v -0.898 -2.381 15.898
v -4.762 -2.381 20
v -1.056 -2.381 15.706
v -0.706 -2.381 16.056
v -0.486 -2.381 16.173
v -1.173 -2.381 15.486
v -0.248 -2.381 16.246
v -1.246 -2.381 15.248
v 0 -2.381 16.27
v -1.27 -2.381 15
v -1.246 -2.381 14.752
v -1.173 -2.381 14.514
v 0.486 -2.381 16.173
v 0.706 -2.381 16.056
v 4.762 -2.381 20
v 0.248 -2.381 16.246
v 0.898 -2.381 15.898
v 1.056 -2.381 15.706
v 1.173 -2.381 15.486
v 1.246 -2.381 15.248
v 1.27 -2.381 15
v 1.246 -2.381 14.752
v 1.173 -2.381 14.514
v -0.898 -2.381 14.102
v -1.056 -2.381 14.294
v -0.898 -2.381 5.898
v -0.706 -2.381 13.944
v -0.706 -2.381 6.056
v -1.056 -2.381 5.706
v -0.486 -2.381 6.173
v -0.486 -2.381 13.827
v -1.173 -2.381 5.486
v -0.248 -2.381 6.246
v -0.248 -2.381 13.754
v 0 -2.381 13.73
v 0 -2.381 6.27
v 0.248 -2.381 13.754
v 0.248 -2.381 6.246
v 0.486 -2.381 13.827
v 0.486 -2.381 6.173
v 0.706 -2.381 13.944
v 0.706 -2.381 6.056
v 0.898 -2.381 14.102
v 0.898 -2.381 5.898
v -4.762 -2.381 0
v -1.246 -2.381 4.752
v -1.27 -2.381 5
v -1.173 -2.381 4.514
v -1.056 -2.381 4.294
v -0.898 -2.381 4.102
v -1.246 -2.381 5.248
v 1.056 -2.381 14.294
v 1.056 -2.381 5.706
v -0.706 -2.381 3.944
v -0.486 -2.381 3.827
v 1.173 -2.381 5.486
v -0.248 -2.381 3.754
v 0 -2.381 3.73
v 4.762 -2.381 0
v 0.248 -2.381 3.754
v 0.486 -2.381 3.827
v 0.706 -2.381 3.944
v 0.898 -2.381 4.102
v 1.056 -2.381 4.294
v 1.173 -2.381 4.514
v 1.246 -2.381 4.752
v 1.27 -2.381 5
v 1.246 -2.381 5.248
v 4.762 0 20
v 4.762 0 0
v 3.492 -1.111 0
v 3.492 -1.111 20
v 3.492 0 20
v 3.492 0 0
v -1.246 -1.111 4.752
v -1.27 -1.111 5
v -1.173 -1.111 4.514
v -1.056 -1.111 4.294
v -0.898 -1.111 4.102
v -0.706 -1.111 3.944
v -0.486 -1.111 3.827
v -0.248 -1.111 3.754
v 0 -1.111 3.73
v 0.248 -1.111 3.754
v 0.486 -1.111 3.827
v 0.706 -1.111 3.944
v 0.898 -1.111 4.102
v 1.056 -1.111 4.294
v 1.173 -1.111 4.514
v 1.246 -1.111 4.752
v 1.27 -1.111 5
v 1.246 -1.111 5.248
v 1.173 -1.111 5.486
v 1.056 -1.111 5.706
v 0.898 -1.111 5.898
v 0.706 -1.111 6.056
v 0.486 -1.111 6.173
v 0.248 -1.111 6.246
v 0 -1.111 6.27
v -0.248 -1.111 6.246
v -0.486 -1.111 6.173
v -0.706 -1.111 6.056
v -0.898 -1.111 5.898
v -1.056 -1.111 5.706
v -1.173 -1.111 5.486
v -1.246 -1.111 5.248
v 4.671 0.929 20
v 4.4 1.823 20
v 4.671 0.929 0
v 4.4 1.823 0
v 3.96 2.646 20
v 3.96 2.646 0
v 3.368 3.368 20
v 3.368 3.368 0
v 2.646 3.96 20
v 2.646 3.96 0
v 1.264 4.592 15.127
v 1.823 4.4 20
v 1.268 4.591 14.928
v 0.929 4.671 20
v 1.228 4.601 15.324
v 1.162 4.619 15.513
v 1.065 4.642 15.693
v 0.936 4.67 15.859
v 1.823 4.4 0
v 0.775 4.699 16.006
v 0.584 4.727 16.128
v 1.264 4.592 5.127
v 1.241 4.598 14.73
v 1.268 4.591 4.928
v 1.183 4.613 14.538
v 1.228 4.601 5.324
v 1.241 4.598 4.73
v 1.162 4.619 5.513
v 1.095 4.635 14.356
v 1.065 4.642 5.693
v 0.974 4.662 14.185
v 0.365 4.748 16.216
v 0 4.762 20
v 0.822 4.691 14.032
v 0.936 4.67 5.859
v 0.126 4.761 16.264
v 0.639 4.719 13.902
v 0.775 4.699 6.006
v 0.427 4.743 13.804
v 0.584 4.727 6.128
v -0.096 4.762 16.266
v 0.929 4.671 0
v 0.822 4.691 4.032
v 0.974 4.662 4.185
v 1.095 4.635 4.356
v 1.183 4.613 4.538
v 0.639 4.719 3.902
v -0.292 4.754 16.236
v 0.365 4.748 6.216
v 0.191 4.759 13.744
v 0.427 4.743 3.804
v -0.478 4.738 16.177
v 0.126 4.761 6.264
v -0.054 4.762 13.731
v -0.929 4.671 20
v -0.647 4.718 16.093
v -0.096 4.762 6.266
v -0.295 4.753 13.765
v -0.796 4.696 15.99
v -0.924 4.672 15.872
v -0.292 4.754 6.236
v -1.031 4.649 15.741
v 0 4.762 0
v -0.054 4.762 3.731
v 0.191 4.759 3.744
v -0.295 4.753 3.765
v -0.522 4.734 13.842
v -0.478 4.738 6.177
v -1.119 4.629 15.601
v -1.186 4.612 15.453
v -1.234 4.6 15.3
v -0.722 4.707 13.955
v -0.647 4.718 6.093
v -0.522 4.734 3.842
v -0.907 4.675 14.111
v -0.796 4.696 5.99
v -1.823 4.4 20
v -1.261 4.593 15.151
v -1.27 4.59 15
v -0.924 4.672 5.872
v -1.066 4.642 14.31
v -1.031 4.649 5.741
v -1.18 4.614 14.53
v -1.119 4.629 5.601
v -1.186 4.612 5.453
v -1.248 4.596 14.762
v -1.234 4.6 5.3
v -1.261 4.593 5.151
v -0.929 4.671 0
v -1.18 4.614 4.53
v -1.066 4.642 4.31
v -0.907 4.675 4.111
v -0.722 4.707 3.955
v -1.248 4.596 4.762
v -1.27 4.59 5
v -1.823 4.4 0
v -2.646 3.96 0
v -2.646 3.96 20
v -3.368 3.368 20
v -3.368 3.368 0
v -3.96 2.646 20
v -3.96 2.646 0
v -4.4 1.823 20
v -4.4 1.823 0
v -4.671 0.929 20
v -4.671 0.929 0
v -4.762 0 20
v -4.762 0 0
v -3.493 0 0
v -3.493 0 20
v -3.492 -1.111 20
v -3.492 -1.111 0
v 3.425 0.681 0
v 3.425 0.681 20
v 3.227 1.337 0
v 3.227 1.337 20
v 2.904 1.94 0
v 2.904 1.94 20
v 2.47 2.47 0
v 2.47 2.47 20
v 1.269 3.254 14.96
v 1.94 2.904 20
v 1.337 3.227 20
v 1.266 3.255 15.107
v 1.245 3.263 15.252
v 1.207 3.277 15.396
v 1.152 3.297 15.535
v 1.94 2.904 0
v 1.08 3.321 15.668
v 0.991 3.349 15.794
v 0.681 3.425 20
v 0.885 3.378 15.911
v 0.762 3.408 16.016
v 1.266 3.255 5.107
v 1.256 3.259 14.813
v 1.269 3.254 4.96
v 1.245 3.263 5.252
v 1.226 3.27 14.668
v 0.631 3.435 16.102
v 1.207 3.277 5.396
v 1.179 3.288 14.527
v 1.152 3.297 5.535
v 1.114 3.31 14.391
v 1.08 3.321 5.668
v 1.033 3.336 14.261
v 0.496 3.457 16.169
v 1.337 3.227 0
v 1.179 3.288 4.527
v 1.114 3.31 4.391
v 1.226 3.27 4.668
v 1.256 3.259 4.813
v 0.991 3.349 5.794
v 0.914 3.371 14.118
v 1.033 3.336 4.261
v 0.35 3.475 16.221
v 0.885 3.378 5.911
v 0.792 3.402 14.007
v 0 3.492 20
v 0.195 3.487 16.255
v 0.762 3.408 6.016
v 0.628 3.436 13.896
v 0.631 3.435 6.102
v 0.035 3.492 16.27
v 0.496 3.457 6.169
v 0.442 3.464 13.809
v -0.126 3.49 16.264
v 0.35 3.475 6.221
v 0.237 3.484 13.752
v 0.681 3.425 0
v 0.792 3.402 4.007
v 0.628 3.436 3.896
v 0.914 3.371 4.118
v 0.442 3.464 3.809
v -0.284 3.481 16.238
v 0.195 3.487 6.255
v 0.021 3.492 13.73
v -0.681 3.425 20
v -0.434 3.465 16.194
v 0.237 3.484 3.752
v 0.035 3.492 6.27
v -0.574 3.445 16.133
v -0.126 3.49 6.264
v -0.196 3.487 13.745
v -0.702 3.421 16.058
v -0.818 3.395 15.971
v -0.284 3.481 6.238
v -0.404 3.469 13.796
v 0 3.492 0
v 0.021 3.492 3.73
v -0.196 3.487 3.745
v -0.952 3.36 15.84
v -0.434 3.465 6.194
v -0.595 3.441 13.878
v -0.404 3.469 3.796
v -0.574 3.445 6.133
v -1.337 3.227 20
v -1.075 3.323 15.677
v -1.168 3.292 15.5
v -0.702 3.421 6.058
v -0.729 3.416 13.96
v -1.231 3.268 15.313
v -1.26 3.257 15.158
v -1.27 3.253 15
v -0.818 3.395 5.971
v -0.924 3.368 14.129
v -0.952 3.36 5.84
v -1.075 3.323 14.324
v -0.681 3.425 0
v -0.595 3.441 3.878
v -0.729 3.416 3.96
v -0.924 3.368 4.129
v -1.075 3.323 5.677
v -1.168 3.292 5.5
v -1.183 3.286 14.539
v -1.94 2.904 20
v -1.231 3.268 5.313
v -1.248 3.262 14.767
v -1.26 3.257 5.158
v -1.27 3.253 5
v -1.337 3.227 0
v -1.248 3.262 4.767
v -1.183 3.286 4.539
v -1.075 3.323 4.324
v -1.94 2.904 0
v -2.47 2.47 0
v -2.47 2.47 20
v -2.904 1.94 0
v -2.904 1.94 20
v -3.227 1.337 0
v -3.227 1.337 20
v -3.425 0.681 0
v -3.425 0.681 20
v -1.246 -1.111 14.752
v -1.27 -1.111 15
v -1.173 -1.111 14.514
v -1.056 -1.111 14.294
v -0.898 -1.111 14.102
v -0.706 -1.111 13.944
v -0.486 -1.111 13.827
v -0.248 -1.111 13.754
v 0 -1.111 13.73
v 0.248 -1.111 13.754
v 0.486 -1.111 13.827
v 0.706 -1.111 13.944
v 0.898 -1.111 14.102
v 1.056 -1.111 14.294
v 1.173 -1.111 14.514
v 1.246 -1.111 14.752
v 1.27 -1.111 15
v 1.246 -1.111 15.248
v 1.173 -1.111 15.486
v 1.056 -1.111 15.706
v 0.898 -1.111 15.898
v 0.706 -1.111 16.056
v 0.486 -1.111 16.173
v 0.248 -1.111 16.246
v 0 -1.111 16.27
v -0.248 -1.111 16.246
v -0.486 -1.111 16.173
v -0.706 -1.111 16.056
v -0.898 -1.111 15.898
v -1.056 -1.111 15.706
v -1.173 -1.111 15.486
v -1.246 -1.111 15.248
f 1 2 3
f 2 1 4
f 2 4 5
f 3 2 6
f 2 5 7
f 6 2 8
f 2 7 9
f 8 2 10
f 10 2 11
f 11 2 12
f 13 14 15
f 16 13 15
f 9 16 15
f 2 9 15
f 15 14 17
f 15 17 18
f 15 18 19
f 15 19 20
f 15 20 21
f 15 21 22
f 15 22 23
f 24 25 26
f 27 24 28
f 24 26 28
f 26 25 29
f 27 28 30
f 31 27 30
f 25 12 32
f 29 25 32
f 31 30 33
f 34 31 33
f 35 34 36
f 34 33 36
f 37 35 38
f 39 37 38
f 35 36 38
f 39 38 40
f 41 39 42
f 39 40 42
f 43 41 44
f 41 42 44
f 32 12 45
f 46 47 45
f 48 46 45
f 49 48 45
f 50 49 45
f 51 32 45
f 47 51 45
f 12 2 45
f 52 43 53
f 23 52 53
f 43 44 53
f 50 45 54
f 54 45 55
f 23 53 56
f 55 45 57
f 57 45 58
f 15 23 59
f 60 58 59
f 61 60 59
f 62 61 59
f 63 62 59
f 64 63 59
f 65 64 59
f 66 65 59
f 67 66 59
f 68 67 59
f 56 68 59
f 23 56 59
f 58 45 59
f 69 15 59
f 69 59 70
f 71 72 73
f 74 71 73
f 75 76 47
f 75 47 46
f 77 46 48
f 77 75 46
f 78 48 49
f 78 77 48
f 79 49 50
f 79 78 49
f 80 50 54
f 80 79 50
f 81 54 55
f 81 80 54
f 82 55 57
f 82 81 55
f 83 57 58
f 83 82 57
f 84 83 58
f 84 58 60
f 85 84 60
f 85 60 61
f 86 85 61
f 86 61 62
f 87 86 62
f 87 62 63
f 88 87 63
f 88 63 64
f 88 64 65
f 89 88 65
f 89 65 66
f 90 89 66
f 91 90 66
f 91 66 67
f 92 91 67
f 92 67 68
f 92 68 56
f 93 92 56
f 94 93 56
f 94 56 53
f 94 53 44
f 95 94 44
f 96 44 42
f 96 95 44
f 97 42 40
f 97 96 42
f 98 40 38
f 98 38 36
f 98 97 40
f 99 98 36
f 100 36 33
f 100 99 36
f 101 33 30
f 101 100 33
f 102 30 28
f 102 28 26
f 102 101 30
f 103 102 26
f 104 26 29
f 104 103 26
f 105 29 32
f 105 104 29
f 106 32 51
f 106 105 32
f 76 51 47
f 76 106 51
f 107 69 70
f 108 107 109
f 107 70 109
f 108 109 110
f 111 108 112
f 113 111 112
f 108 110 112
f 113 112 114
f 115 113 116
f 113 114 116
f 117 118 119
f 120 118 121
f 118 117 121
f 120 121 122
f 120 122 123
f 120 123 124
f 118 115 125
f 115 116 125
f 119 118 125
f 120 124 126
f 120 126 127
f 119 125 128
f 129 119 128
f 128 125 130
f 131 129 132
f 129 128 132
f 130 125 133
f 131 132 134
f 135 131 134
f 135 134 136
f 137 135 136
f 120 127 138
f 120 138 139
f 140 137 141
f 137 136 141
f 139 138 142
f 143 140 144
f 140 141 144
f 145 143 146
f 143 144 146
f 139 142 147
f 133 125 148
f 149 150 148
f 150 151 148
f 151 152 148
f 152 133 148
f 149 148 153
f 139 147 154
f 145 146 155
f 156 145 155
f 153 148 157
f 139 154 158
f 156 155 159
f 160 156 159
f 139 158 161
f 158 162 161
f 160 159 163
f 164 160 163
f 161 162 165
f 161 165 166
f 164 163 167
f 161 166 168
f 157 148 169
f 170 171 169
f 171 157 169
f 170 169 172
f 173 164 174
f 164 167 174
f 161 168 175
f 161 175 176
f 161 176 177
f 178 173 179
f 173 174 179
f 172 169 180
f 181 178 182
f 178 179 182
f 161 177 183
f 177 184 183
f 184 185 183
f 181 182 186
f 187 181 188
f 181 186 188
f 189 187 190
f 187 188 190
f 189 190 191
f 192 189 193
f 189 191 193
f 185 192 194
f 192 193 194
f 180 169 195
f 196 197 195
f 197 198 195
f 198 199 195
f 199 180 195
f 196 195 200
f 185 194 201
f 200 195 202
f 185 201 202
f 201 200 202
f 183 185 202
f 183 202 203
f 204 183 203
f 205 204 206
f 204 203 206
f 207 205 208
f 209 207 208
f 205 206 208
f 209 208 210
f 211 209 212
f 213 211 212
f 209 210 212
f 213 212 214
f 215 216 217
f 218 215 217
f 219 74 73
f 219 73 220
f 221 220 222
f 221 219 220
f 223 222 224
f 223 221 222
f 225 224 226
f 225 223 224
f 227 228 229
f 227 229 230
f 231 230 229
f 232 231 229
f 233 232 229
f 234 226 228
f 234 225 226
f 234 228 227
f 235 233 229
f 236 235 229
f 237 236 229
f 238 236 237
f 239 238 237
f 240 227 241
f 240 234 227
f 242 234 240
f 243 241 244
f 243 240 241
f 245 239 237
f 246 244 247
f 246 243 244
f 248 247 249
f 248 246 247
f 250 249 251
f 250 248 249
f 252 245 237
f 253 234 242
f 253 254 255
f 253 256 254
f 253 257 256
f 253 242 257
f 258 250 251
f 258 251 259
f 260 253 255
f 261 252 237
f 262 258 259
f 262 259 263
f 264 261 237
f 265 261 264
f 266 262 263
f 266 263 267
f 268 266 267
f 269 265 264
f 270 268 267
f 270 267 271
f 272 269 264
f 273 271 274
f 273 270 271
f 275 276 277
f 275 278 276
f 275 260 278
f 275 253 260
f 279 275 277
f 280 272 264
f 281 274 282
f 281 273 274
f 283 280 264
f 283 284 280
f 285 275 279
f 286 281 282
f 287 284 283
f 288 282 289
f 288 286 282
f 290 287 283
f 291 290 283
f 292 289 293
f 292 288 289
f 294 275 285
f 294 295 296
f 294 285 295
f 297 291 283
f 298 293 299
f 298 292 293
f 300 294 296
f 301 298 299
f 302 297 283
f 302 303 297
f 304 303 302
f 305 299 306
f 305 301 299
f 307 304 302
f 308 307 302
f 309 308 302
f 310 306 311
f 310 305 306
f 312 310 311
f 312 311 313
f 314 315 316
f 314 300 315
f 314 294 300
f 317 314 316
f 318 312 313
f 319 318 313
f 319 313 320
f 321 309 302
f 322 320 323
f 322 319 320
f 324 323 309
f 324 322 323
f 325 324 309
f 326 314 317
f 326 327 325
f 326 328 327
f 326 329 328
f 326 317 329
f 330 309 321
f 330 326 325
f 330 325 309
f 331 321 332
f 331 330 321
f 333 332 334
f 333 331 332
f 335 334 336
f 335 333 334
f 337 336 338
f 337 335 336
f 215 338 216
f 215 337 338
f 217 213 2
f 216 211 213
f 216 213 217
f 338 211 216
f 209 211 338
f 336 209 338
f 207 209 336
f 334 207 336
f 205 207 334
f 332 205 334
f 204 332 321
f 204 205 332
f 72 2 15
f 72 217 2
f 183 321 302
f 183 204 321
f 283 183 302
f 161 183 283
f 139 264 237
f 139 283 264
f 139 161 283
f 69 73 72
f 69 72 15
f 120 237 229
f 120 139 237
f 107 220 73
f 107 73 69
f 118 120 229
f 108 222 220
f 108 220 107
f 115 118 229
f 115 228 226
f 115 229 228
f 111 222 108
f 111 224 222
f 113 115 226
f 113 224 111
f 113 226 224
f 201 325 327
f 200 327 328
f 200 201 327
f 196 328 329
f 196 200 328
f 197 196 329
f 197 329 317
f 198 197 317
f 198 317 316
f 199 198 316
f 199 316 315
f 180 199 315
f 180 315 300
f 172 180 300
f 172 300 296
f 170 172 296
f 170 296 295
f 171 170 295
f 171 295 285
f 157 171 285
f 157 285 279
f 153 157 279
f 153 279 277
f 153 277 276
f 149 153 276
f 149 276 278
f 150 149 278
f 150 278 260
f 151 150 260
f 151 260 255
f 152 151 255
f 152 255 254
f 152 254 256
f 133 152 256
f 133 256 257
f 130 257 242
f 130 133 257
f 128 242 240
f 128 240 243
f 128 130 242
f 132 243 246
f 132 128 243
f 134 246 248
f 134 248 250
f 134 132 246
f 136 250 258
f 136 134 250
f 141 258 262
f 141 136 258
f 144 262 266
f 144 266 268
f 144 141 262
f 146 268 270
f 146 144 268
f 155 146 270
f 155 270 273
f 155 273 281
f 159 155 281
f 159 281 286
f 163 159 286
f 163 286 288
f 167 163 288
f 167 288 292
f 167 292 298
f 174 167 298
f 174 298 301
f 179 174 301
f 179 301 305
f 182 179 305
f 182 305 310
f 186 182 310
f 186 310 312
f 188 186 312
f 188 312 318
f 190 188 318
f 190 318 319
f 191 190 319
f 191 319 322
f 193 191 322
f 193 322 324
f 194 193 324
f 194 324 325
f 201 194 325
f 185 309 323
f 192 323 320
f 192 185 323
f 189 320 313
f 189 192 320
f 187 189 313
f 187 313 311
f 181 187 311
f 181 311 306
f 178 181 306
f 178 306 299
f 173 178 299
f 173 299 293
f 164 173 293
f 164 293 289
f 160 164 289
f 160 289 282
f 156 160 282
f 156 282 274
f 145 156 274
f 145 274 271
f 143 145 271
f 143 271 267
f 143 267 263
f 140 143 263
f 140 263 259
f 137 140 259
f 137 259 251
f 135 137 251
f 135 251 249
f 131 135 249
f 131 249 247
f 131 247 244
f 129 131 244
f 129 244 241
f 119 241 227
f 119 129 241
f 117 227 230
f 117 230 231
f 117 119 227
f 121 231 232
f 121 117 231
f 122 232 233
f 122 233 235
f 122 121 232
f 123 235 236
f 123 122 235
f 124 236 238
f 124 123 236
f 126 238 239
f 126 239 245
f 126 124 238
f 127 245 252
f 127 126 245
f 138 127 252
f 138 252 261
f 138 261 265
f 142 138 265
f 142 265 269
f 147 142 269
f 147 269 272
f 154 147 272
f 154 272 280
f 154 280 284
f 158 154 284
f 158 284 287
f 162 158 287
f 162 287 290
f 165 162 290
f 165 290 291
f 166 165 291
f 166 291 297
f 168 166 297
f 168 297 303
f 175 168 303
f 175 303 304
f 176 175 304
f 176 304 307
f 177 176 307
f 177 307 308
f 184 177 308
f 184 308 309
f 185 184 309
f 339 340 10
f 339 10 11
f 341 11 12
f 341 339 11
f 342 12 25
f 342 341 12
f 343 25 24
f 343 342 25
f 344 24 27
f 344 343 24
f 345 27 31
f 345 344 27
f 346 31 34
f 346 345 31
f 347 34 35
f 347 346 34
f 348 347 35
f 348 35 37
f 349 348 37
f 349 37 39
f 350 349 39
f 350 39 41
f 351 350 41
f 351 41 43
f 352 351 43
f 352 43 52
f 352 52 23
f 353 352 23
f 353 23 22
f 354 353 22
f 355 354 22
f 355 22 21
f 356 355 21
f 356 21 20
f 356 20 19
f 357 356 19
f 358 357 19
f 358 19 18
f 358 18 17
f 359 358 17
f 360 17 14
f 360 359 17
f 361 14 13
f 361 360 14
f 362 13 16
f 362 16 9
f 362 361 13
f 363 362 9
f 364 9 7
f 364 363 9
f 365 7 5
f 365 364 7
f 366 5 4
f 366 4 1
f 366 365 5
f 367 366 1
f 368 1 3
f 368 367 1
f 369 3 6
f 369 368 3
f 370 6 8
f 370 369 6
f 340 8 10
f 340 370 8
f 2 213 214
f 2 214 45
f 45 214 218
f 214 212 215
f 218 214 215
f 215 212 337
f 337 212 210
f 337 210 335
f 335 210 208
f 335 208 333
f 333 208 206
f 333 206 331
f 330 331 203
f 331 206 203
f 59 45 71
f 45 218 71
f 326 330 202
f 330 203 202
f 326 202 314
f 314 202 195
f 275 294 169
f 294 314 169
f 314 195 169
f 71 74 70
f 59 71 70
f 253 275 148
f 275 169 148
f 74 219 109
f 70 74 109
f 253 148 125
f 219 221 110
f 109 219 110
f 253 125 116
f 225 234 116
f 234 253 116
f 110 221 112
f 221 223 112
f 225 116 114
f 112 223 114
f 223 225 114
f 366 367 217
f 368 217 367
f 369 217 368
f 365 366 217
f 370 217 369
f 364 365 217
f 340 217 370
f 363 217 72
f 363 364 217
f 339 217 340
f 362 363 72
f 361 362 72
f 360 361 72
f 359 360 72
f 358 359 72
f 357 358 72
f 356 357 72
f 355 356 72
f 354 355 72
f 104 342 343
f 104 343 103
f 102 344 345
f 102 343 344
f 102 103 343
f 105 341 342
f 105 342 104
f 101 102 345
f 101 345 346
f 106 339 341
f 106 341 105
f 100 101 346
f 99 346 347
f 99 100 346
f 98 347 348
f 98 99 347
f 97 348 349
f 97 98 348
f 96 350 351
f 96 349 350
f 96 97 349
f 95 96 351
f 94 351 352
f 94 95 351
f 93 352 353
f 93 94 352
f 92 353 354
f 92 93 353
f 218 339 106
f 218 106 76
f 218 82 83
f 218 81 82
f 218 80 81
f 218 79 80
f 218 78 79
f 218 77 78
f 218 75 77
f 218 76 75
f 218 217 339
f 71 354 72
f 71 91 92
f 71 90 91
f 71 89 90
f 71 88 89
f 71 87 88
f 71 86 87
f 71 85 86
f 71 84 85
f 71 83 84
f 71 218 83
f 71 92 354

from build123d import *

# Parameters (mm, degrees)
BOSS_EXTRUDE1_DEPTH = 20
CUT_EXTRUDE1_START  = -7.14375
SKETCH2_R           = 1.27
CUT_EXTRUDE1_DEPTH  = 7.14375


with BuildPart() as part:
    # Sketch1 → Boss-Extrude1 (new body)
    with BuildSketch(Plane.XY):
        with BuildLine():
            Line((-4.7625, -2.38125), (4.7625, -2.38125))
            Line((4.7625, -2.38125), (4.7625, 0))
            ThreePointArc((4.7625, 0), (0, 4.7625), (-4.7625, 0))
            Line((-4.7625, 0), (-4.7625, -2.38125))
        make_face()
        with BuildLine():
            Line((-3.4925, -1.11125), (3.4925, -1.11125))
            Line((3.4925, -1.11125), (3.4925, 0))
            ThreePointArc((3.4925, 0), (0, 3.4925), (-3.4925, 0))
            Line((-3.4925, 0), (-3.4925, -1.11125))
        make_face(mode=Mode.SUBTRACT)
    extrude(amount=BOSS_EXTRUDE1_DEPTH)

    # Sketch2 → Cut-Extrude1 (cut)
    with BuildSketch(Plane(origin=(0, -2.38125, 0), x_dir=(-1, 0, 0), z_dir=(0, -1, 0)).offset(CUT_EXTRUDE1_START)):
        with Locations((0, -15.000000033)):
            Circle(SKETCH2_R)
        with Locations((0, -4.999999967)):
            Circle(SKETCH2_R)
    extrude(amount=CUT_EXTRUDE1_DEPTH, mode=Mode.SUBTRACT)


solid = part.part
